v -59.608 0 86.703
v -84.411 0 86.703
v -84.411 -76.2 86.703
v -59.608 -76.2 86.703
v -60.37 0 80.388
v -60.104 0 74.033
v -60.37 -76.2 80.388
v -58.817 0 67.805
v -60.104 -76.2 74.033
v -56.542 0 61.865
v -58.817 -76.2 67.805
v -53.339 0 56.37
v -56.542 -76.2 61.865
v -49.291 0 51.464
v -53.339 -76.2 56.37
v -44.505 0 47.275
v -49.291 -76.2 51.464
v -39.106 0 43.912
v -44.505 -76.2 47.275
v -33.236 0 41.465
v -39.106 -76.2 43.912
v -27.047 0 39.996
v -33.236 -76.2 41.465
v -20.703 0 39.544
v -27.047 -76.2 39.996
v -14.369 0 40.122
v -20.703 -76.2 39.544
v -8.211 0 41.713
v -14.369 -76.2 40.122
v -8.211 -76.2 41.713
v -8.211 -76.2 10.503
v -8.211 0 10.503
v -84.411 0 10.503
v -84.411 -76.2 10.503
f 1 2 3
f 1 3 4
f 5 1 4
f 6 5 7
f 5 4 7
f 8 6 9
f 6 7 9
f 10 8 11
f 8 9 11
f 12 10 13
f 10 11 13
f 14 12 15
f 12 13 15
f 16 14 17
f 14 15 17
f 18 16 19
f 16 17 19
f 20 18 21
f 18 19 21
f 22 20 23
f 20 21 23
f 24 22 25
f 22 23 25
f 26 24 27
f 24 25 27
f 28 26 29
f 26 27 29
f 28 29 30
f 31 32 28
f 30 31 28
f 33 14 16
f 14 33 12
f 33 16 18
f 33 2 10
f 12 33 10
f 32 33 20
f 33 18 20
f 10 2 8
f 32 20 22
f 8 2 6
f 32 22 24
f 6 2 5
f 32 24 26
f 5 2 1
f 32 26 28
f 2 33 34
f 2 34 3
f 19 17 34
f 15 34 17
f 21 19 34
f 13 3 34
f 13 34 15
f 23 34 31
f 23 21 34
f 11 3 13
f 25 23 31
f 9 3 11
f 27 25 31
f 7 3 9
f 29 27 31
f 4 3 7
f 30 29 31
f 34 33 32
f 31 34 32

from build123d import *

# Parameters (mm, degrees)
F0_W     = 76.2
F0_H     = 76.2
F1_DEPTH = 76.2
F2_R     = 39.306587
F3_DEPTH = 101.6


with BuildPart() as f1:
    # F0 (on Front) → F1 (new body)
    with BuildSketch(Plane.XZ):
        with Locations((-46.311049, 48.602506)):
            Rectangle(F0_W, F0_H)
    extrude(amount=F1_DEPTH)

    # F2 (on face) → F3 (cut)
    with BuildSketch(Plane.XZ.offset(76.2)):
        with BuildLine():
            ThreePointArc((-8.211049, 41.7134), (10.932512, 56.060384), (18.212613, 78.848802))
            ThreePointArc((18.212613, 78.848802), (-17.147175, 117.956736), (-59.60796, 86.702506))
            Line((-59.60796, 86.702506), (-8.211049, 86.702506))
            Line((-8.211049, 86.702506), (-8.211049, 41.7134))
        make_face()
        with Locations((-21.093974, 78.848802)):
            Circle(F2_R)
    extrude(amount=-F3_DEPTH, mode=Mode.SUBTRACT)


solid = f1.part
